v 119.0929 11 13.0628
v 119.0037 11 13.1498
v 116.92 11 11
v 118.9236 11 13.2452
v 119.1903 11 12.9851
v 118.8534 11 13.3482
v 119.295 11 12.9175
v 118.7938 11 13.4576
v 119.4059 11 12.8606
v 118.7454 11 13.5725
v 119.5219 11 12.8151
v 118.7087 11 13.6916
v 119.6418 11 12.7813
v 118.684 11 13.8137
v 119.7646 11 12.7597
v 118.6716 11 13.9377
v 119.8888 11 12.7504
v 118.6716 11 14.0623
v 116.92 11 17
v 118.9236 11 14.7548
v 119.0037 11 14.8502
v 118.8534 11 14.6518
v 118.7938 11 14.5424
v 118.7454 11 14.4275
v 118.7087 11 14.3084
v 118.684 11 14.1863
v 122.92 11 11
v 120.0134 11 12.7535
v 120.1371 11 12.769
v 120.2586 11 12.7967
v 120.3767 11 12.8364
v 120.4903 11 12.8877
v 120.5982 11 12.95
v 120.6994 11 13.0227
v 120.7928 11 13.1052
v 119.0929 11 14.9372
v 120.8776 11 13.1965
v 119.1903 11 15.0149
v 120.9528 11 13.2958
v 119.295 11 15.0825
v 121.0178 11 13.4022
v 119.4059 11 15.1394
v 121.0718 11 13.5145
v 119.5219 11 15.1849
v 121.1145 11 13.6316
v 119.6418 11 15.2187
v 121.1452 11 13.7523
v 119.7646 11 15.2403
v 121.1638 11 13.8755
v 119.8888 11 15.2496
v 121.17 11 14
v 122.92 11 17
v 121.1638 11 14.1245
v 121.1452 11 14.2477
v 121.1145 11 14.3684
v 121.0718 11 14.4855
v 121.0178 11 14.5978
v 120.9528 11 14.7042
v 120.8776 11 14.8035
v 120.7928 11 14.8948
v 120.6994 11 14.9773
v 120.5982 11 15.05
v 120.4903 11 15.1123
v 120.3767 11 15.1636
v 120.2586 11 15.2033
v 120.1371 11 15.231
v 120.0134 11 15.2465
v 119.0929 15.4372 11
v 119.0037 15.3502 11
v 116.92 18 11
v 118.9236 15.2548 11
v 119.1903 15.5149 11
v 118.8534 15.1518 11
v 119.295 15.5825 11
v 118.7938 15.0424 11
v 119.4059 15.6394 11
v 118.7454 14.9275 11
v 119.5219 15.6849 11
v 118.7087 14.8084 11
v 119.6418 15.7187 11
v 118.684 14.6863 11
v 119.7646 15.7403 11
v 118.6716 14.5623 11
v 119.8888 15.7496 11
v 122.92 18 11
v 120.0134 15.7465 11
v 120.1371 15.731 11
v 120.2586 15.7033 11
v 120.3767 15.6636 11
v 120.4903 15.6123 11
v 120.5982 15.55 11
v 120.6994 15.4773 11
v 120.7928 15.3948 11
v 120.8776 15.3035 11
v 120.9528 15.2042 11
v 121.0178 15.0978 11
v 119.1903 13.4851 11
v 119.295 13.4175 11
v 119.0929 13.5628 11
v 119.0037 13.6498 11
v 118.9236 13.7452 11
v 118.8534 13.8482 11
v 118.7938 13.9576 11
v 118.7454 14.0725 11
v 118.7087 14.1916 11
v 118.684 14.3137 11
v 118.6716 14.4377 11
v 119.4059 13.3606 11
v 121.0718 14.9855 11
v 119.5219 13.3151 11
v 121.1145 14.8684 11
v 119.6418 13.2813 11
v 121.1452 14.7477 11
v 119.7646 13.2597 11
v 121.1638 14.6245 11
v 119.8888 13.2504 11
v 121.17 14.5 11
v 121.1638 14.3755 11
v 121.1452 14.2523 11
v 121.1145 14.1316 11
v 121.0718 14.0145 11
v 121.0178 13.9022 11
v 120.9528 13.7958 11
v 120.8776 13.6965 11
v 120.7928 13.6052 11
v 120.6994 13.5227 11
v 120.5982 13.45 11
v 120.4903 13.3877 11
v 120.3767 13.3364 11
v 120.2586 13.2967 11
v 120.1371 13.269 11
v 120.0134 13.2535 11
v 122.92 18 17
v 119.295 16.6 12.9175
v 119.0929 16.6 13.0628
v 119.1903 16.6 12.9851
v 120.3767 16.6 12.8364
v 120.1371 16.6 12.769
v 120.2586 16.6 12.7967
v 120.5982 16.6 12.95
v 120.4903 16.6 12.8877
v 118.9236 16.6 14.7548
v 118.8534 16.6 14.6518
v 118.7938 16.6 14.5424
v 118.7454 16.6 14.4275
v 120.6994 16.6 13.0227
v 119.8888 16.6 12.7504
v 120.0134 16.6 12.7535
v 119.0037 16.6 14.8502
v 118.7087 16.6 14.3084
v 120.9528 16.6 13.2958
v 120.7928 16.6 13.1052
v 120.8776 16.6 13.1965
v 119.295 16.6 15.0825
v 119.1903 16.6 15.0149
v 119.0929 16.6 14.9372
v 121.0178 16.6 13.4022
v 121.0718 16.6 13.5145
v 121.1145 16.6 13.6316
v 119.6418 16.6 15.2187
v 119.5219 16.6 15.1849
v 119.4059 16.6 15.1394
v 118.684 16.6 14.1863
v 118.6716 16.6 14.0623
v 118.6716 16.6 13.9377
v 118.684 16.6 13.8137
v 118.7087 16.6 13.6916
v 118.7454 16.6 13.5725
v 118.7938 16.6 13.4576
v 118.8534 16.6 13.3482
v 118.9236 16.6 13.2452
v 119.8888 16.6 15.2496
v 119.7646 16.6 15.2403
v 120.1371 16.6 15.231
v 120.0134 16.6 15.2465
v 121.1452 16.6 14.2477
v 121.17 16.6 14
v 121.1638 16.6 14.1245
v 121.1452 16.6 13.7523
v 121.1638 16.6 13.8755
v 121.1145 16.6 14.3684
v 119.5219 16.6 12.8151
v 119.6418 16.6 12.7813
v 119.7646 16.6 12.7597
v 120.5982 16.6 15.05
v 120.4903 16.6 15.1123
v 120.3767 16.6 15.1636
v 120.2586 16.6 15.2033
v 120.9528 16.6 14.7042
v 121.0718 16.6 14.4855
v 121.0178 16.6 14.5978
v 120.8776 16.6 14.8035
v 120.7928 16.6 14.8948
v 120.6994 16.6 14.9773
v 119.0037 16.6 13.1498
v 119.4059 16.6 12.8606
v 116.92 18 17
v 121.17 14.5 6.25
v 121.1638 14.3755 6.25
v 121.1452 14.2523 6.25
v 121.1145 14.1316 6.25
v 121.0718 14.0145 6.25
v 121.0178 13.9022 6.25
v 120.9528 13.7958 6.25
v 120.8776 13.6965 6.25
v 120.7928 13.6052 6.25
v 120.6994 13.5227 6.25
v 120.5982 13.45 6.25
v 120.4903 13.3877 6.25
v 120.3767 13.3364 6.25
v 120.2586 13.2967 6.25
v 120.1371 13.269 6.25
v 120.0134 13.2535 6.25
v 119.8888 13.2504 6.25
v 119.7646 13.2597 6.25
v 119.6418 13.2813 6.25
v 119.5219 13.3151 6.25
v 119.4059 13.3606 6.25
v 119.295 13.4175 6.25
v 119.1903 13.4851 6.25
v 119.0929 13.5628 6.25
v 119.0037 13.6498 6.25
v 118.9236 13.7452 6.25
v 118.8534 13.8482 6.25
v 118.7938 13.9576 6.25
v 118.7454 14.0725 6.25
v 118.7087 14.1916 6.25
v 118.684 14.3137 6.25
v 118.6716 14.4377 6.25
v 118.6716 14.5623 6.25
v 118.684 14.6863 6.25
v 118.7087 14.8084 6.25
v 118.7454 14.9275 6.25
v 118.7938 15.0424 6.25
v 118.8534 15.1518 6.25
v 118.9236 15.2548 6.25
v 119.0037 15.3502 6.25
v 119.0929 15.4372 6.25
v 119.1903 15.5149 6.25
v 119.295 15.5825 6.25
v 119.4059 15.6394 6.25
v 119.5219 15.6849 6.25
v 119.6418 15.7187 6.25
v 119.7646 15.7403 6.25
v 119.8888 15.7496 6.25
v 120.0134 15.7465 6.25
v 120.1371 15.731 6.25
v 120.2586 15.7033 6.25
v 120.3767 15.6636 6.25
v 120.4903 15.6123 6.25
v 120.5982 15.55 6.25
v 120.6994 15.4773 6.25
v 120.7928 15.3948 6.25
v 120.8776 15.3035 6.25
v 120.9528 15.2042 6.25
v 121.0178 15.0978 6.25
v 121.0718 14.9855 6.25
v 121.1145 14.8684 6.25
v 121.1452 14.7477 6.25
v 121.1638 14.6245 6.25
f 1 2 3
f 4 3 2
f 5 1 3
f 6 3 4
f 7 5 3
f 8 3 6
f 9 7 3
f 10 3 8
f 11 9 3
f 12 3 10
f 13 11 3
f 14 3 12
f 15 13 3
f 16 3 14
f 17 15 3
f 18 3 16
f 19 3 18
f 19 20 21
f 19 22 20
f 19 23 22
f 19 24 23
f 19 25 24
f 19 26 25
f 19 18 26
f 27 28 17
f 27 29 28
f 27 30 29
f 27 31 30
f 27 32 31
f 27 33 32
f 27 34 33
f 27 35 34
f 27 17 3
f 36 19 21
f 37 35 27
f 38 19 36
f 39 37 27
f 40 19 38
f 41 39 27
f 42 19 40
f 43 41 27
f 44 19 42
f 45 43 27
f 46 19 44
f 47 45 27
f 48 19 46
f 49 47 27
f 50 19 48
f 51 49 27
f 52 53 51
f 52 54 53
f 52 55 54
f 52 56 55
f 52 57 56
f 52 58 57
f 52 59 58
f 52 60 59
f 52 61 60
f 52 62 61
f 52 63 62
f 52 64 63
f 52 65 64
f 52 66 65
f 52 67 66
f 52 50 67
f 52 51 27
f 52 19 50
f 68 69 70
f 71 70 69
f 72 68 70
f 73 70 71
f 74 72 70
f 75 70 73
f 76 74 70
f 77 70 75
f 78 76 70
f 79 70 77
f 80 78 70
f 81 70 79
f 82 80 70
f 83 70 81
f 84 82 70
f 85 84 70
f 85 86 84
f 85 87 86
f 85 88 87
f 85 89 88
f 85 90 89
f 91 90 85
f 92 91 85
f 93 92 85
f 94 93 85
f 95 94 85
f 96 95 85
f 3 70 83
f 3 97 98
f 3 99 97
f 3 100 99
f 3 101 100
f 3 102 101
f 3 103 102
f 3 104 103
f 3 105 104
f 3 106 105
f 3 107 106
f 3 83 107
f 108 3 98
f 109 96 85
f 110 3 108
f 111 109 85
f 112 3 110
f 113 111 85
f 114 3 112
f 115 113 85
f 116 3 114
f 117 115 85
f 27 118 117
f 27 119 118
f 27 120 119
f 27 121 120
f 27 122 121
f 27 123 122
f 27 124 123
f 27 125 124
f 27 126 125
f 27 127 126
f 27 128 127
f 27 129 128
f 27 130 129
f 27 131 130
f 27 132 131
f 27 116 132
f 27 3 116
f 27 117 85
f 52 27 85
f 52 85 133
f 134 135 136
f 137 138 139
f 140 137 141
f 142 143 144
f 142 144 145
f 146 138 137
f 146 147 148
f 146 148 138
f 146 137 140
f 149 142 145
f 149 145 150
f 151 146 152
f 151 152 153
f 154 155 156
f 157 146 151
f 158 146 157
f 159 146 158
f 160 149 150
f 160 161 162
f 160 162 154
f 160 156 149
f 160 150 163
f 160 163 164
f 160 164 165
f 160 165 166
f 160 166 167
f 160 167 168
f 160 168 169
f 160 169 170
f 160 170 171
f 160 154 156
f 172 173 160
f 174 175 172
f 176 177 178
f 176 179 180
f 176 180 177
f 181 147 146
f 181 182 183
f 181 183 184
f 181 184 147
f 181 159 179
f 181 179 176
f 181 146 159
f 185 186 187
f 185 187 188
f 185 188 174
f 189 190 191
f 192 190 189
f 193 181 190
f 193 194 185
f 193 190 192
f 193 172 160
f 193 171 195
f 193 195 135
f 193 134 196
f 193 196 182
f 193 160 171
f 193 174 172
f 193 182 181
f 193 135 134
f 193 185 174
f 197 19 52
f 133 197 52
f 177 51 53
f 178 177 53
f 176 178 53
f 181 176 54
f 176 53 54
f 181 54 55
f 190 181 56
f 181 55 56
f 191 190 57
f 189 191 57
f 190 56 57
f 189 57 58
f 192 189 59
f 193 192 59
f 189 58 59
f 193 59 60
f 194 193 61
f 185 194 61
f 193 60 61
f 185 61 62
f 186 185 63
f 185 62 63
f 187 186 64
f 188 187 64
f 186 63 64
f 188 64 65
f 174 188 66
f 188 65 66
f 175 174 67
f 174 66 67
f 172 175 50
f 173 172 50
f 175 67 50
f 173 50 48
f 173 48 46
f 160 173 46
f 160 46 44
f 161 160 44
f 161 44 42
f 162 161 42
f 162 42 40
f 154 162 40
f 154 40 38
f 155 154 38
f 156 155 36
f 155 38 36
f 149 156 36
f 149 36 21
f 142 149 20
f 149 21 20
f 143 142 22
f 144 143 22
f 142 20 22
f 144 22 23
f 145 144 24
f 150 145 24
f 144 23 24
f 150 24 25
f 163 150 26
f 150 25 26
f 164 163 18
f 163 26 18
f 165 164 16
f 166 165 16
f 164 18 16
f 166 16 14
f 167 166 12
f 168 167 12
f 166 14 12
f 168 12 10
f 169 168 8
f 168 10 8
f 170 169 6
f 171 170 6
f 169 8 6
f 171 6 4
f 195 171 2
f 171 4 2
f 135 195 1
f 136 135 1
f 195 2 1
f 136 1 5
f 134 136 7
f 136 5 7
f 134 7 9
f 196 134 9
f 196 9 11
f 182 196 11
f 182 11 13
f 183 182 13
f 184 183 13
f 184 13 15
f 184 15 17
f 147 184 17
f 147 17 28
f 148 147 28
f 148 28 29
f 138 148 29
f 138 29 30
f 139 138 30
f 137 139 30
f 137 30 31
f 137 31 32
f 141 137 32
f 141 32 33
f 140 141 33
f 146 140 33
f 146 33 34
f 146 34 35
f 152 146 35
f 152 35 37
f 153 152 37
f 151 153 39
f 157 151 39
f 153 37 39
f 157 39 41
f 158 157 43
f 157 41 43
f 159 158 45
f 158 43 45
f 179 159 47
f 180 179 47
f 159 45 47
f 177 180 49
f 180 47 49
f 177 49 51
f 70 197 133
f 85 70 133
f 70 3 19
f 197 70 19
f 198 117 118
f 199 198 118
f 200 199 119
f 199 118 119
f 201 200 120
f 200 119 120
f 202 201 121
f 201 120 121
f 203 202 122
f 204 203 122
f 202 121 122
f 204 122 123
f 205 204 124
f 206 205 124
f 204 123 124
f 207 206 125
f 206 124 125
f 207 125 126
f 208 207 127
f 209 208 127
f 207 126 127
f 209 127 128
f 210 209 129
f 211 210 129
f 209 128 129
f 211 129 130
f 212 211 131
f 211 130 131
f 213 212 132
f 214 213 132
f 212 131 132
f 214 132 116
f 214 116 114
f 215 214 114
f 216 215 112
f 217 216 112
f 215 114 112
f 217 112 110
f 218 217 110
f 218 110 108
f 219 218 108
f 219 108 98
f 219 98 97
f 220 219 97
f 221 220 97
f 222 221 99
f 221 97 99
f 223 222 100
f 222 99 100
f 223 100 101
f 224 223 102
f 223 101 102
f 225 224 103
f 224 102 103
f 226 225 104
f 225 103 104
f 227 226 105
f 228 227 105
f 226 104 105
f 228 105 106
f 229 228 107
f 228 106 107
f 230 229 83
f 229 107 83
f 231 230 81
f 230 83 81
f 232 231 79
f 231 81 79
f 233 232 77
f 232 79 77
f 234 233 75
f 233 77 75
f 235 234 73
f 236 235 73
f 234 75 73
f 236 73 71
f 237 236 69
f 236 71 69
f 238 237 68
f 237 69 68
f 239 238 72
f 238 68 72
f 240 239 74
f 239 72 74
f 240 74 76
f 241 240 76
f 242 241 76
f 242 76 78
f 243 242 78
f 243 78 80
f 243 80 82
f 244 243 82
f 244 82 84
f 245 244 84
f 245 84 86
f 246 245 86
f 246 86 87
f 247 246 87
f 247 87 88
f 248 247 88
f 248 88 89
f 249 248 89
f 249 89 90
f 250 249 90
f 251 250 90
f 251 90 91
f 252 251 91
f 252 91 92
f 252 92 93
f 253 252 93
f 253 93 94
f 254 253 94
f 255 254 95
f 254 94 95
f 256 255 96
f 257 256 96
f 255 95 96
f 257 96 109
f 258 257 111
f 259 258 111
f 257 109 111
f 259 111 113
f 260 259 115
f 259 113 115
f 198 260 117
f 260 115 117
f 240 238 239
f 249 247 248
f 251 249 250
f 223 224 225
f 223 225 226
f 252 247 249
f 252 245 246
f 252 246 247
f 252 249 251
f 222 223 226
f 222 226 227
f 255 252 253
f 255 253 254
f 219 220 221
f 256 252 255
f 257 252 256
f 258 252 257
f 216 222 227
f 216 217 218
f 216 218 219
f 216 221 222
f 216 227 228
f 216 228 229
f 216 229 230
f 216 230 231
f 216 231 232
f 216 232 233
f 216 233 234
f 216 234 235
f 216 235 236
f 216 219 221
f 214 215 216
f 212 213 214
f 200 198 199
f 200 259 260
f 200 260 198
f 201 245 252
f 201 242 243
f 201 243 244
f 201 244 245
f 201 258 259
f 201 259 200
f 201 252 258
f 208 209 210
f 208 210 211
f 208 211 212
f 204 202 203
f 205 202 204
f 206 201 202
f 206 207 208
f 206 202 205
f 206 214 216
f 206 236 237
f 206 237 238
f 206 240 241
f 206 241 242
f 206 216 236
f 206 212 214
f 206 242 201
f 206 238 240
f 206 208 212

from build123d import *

# Parameters (mm, degrees)
SKETCH044_W     = 6
SKETCH044_H     = 6
PAD022_DEPTH    = 7
SKETCH046_R     = 1.25
POCKET013_DEPTH = 5.6
SKETCH047_R     = 1.25
PAD024_DEPTH    = 4.75


with BuildPart() as part:
    # Sketch044 → Pad022 (new body)
    with BuildSketch(Plane(origin=(-25.08, 0, 0), x_dir=(1, 0, 0), z_dir=(0, -1, 0))):
        with Locations((145, 14)):
            Rectangle(SKETCH044_W, SKETCH044_H)
    extrude(amount=-PAD022_DEPTH)

    # Sketch046 (on Face5 of Pad022) → Pocket013 (cut)
    with BuildSketch(Plane.XZ):
        with Locations((119.92, 14)):
            Circle(SKETCH046_R)
    extrude(amount=-POCKET013_DEPTH, mode=Mode.SUBTRACT)

    # Sketch047 → Pad024 (join)
    with BuildSketch(Plane(origin=(0, 0, 11), x_dir=(1, 0, 0), z_dir=(0, 0, -1))):
        with Locations((119.92, -3.5)):
            Circle(SKETCH047_R)
    extrude(amount=PAD024_DEPTH)


with BuildPart() as part_1:
    # Body009 placement: moved
    add(part.part.moved(Location((0, 11, 0))))


solid = part_1.part
